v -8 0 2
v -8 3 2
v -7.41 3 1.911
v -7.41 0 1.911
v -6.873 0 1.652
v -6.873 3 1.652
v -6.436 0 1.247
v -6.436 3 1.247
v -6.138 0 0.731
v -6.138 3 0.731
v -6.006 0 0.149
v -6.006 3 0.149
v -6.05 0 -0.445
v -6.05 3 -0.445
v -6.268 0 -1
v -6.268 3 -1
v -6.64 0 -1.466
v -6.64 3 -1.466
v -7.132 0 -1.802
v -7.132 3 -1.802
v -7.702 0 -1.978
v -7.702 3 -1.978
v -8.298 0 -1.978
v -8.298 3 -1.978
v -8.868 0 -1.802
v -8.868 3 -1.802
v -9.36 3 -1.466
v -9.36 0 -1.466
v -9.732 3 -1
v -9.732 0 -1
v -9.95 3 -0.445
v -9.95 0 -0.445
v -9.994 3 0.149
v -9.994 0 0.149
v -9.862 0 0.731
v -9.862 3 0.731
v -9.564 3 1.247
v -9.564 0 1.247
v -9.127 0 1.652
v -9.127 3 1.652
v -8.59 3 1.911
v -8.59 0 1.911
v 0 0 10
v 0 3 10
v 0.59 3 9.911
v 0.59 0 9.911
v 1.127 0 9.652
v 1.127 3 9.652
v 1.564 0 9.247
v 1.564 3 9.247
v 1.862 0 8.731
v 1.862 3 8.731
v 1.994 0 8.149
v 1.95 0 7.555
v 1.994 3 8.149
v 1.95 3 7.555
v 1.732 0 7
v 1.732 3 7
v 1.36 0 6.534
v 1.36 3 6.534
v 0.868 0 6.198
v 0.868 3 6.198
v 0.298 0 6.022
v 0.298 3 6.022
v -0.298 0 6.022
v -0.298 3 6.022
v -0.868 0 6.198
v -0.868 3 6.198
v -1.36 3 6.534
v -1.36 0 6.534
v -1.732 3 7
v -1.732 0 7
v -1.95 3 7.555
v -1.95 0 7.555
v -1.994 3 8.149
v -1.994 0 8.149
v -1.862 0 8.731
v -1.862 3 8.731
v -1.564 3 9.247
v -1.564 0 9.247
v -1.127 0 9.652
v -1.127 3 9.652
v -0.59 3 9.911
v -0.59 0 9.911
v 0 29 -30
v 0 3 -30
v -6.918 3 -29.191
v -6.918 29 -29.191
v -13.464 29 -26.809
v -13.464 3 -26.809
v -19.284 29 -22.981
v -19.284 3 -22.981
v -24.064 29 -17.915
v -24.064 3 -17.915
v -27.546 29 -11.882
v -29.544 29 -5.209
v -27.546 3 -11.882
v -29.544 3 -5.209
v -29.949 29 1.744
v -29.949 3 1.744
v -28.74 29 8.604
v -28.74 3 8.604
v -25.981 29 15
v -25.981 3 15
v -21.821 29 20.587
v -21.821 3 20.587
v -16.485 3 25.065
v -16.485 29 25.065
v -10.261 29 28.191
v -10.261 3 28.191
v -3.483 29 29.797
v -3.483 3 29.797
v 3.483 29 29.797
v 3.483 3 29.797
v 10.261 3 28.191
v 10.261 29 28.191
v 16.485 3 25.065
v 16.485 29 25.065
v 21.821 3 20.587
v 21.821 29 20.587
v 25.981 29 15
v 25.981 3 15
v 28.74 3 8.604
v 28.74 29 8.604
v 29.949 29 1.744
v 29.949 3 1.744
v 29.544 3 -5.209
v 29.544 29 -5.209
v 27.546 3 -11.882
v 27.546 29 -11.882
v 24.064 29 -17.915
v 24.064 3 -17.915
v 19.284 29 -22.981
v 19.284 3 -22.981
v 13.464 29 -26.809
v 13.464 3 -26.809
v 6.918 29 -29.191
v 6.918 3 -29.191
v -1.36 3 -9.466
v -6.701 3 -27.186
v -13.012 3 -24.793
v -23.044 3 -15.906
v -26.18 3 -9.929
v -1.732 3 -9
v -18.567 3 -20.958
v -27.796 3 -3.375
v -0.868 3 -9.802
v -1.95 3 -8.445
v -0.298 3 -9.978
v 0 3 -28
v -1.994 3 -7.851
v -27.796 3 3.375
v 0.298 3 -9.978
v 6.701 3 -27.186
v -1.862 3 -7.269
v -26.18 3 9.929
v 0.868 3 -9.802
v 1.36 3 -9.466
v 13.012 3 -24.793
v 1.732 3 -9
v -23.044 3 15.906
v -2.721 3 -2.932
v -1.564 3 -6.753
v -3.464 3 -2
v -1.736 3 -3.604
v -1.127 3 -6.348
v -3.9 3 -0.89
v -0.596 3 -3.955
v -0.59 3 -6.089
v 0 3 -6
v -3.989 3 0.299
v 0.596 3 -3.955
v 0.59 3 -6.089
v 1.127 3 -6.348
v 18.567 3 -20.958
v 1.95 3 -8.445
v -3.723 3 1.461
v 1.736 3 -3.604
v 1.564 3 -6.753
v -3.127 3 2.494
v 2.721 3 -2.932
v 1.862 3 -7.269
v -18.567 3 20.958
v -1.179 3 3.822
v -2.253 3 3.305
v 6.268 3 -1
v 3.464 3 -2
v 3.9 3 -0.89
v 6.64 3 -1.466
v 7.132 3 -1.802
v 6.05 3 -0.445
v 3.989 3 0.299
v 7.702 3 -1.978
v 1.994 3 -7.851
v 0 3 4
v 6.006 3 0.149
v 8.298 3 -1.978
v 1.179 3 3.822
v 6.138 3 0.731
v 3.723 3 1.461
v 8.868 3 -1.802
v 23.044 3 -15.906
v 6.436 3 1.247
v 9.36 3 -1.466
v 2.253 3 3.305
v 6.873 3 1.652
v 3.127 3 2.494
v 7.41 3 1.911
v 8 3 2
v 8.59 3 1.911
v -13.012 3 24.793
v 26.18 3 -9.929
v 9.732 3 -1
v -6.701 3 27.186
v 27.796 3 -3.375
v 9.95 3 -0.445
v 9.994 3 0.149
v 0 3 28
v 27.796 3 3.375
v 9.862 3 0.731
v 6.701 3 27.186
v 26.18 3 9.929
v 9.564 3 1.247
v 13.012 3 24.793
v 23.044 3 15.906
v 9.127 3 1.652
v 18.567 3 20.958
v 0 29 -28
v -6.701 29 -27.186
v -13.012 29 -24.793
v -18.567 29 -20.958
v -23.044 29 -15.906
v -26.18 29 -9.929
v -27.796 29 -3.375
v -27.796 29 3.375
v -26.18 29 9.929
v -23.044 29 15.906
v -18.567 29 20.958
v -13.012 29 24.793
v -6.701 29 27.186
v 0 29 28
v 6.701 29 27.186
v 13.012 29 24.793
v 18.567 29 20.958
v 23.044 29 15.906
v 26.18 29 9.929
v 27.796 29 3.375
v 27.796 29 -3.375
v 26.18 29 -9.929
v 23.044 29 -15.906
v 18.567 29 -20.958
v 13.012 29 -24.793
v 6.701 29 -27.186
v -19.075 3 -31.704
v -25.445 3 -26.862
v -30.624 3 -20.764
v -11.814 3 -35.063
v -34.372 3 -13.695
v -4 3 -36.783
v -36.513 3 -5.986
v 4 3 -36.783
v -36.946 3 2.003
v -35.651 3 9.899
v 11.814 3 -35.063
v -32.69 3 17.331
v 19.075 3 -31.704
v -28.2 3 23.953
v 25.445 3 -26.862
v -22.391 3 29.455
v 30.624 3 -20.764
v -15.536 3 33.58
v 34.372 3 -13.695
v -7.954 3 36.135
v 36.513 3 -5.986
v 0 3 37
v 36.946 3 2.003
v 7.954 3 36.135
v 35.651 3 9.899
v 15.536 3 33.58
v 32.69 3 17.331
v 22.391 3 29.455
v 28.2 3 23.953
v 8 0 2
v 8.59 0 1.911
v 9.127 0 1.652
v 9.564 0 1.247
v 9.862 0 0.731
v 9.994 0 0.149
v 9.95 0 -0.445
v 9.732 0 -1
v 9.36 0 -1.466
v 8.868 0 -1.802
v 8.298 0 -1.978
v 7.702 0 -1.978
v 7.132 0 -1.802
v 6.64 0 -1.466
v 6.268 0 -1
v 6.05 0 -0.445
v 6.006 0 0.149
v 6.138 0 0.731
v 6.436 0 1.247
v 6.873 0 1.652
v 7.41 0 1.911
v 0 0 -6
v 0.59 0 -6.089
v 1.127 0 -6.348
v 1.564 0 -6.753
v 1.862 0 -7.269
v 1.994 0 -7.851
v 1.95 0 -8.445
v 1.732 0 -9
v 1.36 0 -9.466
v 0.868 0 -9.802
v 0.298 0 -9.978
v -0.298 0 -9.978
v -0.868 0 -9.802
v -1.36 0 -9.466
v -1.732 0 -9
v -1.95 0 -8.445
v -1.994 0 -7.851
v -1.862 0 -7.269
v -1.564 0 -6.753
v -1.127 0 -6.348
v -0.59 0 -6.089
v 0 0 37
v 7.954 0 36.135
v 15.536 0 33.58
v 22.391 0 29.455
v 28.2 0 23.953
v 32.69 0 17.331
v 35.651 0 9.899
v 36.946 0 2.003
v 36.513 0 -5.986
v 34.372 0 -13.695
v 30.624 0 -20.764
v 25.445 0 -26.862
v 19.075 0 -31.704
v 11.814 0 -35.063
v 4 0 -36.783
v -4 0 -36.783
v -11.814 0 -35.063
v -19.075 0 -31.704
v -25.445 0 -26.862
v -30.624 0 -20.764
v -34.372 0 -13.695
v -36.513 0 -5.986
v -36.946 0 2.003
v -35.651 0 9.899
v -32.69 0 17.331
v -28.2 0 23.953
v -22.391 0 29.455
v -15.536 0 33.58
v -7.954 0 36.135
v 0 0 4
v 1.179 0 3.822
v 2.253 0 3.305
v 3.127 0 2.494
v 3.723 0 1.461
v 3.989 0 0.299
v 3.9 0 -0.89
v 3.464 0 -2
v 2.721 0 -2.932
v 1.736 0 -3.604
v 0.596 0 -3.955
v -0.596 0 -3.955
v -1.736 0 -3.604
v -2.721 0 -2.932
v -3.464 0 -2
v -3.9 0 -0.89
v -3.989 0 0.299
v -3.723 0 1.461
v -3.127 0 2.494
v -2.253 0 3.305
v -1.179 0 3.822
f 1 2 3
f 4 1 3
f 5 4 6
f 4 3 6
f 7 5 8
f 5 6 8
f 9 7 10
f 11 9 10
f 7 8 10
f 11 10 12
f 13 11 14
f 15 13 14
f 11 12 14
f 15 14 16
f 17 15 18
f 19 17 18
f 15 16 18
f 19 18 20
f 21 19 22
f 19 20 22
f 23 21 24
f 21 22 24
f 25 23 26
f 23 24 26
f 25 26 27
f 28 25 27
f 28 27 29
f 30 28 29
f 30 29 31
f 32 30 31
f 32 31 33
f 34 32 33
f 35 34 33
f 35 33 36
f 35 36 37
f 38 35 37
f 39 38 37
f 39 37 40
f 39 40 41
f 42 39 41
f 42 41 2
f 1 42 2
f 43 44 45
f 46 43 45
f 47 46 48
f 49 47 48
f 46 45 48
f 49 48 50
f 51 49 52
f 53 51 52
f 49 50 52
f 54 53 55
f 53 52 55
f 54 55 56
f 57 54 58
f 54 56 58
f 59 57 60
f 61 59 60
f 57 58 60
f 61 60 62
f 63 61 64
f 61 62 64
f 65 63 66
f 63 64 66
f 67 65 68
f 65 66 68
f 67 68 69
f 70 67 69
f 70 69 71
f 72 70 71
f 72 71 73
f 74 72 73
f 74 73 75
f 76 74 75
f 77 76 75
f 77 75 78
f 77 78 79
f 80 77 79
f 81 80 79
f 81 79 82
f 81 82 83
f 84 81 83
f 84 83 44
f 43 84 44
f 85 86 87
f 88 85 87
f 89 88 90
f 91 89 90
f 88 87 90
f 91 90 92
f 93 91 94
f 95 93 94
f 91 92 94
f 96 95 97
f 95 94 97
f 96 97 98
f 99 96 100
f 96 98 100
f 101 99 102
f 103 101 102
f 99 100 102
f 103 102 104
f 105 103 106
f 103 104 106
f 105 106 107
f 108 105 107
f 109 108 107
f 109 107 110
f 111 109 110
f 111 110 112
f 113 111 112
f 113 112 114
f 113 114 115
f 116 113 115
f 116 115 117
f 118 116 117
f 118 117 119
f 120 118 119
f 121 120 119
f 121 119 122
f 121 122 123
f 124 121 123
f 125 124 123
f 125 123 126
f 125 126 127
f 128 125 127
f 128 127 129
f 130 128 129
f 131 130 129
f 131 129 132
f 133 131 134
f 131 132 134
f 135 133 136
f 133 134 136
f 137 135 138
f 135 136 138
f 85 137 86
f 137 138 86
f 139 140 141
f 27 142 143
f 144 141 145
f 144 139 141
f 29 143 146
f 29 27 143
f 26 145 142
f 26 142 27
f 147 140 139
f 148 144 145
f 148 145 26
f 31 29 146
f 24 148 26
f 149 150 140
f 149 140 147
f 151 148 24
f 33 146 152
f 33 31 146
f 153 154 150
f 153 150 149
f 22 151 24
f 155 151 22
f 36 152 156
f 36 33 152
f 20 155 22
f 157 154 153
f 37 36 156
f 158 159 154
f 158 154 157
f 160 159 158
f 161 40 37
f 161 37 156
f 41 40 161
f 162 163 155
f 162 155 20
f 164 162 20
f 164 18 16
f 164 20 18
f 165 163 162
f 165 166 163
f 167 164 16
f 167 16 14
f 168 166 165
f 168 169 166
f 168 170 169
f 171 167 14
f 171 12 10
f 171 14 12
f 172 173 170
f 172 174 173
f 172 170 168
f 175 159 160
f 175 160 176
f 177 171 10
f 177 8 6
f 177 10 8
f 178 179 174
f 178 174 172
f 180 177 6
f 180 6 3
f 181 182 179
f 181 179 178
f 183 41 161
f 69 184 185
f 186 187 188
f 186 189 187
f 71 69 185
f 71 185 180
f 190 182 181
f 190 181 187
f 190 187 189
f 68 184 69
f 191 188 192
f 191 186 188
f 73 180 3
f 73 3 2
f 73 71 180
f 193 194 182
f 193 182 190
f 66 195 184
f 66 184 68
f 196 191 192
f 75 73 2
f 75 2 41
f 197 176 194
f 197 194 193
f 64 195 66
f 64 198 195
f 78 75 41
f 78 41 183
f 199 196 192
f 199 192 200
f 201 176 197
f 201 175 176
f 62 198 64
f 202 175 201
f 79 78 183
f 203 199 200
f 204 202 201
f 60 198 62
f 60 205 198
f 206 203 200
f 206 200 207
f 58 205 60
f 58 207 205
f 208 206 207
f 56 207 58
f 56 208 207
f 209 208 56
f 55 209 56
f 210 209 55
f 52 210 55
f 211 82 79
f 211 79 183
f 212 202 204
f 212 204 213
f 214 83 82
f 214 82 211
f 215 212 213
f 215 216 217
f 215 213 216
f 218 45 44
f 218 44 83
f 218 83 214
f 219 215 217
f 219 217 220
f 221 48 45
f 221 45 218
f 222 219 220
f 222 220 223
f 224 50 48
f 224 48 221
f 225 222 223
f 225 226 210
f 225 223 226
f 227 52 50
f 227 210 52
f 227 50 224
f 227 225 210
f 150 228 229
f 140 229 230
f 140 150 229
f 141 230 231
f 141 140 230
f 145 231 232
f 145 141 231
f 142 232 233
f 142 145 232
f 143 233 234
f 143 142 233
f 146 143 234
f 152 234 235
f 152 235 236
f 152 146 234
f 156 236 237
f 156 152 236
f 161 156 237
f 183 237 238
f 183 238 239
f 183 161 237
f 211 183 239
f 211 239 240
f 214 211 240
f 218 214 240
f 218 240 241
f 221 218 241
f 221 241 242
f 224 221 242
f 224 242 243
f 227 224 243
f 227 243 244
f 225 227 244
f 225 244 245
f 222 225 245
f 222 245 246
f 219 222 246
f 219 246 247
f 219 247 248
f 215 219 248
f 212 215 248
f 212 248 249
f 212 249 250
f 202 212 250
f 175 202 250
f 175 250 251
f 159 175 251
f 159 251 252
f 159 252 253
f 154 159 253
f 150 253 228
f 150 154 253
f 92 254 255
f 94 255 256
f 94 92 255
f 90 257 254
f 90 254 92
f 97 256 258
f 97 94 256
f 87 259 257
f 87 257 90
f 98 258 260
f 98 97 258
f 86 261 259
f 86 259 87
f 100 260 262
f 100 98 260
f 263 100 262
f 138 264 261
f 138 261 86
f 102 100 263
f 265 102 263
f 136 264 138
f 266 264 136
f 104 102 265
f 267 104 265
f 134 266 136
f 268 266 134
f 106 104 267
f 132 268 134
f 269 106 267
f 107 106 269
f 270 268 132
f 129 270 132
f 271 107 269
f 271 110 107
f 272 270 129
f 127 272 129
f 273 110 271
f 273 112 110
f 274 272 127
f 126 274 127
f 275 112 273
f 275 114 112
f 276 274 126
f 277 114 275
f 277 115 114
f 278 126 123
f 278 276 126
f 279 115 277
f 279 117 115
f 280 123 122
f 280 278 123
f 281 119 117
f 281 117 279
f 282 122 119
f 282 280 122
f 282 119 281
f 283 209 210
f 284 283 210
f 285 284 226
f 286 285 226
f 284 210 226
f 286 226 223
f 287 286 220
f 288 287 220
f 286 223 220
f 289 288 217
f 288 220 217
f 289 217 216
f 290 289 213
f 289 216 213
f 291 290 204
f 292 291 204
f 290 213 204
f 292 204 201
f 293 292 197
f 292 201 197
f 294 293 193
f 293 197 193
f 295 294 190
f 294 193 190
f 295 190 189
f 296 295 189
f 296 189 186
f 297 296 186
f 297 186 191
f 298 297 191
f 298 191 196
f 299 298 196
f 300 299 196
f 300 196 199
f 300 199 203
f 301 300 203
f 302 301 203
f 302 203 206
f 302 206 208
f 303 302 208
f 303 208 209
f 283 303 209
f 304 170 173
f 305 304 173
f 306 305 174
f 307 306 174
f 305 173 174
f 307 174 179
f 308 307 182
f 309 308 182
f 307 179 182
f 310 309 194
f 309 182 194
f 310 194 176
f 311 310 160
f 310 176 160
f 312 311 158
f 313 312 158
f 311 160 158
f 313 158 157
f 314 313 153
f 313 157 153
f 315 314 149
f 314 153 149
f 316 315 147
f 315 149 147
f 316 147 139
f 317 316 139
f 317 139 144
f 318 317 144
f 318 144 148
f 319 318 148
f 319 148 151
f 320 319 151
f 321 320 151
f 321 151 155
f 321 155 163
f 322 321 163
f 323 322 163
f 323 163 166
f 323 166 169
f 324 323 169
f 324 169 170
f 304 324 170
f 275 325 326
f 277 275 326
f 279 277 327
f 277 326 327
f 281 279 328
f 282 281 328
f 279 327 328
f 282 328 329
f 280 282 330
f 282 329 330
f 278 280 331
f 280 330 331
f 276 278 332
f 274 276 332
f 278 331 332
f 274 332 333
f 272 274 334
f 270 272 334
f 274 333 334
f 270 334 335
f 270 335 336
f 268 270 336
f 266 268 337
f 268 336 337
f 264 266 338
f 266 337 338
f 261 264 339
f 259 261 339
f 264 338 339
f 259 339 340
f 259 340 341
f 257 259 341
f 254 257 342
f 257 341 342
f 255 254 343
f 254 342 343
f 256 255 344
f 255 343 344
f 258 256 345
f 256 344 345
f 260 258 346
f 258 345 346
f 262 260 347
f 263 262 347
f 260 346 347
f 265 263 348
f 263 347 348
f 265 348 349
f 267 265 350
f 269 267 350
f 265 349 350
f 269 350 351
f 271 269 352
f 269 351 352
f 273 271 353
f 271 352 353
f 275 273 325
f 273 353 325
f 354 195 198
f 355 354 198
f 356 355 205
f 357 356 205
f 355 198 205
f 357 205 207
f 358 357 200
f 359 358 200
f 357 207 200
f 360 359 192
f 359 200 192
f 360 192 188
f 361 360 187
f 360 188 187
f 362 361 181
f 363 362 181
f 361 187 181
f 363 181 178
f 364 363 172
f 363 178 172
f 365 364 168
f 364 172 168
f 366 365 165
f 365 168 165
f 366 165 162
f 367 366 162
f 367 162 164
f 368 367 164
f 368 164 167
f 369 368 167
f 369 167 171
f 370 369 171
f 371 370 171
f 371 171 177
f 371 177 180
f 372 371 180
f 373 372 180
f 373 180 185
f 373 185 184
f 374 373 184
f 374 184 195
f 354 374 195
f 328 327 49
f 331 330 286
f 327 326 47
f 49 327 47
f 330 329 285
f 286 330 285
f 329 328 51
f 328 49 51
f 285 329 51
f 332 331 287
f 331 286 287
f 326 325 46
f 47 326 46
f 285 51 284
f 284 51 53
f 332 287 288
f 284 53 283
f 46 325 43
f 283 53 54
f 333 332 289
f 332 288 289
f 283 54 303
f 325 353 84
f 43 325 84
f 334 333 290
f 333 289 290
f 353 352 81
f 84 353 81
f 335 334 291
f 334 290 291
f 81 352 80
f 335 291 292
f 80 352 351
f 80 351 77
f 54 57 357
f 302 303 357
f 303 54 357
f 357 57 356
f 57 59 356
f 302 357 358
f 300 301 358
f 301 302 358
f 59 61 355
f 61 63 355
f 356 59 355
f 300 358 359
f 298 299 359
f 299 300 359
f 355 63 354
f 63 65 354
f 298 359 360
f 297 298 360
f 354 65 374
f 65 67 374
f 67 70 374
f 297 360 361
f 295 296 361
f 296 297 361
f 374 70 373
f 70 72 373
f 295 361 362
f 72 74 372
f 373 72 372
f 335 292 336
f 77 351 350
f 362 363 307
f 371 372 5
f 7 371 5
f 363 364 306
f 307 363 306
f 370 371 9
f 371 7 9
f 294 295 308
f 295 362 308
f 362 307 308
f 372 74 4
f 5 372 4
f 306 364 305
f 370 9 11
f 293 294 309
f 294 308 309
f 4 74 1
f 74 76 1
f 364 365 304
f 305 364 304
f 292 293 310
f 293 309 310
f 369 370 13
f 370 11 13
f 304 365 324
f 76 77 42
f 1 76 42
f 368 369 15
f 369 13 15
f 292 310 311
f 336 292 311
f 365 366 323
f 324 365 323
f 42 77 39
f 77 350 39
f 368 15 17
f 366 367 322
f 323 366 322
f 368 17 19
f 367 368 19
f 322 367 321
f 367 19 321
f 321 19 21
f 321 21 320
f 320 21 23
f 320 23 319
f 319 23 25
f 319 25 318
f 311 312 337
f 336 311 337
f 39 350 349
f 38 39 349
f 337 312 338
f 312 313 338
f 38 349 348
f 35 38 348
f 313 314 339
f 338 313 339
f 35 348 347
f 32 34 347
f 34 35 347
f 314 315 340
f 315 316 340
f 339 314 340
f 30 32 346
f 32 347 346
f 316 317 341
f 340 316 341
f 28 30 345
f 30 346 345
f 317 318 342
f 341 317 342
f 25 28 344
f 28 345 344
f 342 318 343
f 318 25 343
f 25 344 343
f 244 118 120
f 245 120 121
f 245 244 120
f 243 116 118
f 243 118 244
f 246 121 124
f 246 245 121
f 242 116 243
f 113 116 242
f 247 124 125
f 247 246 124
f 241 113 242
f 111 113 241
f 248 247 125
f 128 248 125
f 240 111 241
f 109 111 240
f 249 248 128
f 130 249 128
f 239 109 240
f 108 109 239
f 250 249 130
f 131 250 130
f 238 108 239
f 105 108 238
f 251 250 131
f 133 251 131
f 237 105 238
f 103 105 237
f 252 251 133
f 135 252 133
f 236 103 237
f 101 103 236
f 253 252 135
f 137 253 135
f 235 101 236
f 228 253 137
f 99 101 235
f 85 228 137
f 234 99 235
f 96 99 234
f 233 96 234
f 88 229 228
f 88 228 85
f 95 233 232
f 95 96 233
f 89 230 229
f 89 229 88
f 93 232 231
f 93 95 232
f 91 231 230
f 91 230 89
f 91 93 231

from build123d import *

# Parameters (mm, degrees)
SKETCH1_R           = 37
BOSS_EXTRUDE1_DEPTH = 3
SKETCH1_3_R         = 30
SKETCH1_3_R_2       = 28
BOSS_EXTRUDE2_DEPTH = 29
SKETCH2_R           = 4
SKETCH2_R_2         = 2
CUT_EXTRUDE1_DEPTH  = 59.429444632


with BuildPart() as part:
    # Sketch1 → Boss-Extrude1 (new body)
    with BuildSketch(Plane(origin=(0, 0, 0), x_dir=(1, 0, 0), z_dir=(0, 1, 0))):
        Circle(SKETCH1_R)
    extrude(amount=BOSS_EXTRUDE1_DEPTH)

    # Sketch1<3> → Boss-Extrude2 (add)
    with BuildSketch(Plane(origin=(0, 0, 0), x_dir=(1, 0, 0), z_dir=(0, 1, 0))):
        Circle(SKETCH1_3_R)
        Circle(SKETCH1_3_R_2, mode=Mode.SUBTRACT)
    extrude(amount=BOSS_EXTRUDE2_DEPTH)

    # Sketch2 → Cut-Extrude1 (cut, through all)
    with BuildSketch(Plane(origin=(0, 3, 0), x_dir=(1, 0, 0), z_dir=(0, 1, 0))):
        Circle(SKETCH2_R)
        with Locations((8, 0)):
            Circle(SKETCH2_R_2)
        with Locations((0, -8)):
            Circle(SKETCH2_R_2)
        with Locations((-8, 0)):
            Circle(SKETCH2_R_2)
        with Locations((0, 8)):
            Circle(SKETCH2_R_2)
    extrude(amount=-CUT_EXTRUDE1_DEPTH, mode=Mode.SUBTRACT)


solid = part.part
